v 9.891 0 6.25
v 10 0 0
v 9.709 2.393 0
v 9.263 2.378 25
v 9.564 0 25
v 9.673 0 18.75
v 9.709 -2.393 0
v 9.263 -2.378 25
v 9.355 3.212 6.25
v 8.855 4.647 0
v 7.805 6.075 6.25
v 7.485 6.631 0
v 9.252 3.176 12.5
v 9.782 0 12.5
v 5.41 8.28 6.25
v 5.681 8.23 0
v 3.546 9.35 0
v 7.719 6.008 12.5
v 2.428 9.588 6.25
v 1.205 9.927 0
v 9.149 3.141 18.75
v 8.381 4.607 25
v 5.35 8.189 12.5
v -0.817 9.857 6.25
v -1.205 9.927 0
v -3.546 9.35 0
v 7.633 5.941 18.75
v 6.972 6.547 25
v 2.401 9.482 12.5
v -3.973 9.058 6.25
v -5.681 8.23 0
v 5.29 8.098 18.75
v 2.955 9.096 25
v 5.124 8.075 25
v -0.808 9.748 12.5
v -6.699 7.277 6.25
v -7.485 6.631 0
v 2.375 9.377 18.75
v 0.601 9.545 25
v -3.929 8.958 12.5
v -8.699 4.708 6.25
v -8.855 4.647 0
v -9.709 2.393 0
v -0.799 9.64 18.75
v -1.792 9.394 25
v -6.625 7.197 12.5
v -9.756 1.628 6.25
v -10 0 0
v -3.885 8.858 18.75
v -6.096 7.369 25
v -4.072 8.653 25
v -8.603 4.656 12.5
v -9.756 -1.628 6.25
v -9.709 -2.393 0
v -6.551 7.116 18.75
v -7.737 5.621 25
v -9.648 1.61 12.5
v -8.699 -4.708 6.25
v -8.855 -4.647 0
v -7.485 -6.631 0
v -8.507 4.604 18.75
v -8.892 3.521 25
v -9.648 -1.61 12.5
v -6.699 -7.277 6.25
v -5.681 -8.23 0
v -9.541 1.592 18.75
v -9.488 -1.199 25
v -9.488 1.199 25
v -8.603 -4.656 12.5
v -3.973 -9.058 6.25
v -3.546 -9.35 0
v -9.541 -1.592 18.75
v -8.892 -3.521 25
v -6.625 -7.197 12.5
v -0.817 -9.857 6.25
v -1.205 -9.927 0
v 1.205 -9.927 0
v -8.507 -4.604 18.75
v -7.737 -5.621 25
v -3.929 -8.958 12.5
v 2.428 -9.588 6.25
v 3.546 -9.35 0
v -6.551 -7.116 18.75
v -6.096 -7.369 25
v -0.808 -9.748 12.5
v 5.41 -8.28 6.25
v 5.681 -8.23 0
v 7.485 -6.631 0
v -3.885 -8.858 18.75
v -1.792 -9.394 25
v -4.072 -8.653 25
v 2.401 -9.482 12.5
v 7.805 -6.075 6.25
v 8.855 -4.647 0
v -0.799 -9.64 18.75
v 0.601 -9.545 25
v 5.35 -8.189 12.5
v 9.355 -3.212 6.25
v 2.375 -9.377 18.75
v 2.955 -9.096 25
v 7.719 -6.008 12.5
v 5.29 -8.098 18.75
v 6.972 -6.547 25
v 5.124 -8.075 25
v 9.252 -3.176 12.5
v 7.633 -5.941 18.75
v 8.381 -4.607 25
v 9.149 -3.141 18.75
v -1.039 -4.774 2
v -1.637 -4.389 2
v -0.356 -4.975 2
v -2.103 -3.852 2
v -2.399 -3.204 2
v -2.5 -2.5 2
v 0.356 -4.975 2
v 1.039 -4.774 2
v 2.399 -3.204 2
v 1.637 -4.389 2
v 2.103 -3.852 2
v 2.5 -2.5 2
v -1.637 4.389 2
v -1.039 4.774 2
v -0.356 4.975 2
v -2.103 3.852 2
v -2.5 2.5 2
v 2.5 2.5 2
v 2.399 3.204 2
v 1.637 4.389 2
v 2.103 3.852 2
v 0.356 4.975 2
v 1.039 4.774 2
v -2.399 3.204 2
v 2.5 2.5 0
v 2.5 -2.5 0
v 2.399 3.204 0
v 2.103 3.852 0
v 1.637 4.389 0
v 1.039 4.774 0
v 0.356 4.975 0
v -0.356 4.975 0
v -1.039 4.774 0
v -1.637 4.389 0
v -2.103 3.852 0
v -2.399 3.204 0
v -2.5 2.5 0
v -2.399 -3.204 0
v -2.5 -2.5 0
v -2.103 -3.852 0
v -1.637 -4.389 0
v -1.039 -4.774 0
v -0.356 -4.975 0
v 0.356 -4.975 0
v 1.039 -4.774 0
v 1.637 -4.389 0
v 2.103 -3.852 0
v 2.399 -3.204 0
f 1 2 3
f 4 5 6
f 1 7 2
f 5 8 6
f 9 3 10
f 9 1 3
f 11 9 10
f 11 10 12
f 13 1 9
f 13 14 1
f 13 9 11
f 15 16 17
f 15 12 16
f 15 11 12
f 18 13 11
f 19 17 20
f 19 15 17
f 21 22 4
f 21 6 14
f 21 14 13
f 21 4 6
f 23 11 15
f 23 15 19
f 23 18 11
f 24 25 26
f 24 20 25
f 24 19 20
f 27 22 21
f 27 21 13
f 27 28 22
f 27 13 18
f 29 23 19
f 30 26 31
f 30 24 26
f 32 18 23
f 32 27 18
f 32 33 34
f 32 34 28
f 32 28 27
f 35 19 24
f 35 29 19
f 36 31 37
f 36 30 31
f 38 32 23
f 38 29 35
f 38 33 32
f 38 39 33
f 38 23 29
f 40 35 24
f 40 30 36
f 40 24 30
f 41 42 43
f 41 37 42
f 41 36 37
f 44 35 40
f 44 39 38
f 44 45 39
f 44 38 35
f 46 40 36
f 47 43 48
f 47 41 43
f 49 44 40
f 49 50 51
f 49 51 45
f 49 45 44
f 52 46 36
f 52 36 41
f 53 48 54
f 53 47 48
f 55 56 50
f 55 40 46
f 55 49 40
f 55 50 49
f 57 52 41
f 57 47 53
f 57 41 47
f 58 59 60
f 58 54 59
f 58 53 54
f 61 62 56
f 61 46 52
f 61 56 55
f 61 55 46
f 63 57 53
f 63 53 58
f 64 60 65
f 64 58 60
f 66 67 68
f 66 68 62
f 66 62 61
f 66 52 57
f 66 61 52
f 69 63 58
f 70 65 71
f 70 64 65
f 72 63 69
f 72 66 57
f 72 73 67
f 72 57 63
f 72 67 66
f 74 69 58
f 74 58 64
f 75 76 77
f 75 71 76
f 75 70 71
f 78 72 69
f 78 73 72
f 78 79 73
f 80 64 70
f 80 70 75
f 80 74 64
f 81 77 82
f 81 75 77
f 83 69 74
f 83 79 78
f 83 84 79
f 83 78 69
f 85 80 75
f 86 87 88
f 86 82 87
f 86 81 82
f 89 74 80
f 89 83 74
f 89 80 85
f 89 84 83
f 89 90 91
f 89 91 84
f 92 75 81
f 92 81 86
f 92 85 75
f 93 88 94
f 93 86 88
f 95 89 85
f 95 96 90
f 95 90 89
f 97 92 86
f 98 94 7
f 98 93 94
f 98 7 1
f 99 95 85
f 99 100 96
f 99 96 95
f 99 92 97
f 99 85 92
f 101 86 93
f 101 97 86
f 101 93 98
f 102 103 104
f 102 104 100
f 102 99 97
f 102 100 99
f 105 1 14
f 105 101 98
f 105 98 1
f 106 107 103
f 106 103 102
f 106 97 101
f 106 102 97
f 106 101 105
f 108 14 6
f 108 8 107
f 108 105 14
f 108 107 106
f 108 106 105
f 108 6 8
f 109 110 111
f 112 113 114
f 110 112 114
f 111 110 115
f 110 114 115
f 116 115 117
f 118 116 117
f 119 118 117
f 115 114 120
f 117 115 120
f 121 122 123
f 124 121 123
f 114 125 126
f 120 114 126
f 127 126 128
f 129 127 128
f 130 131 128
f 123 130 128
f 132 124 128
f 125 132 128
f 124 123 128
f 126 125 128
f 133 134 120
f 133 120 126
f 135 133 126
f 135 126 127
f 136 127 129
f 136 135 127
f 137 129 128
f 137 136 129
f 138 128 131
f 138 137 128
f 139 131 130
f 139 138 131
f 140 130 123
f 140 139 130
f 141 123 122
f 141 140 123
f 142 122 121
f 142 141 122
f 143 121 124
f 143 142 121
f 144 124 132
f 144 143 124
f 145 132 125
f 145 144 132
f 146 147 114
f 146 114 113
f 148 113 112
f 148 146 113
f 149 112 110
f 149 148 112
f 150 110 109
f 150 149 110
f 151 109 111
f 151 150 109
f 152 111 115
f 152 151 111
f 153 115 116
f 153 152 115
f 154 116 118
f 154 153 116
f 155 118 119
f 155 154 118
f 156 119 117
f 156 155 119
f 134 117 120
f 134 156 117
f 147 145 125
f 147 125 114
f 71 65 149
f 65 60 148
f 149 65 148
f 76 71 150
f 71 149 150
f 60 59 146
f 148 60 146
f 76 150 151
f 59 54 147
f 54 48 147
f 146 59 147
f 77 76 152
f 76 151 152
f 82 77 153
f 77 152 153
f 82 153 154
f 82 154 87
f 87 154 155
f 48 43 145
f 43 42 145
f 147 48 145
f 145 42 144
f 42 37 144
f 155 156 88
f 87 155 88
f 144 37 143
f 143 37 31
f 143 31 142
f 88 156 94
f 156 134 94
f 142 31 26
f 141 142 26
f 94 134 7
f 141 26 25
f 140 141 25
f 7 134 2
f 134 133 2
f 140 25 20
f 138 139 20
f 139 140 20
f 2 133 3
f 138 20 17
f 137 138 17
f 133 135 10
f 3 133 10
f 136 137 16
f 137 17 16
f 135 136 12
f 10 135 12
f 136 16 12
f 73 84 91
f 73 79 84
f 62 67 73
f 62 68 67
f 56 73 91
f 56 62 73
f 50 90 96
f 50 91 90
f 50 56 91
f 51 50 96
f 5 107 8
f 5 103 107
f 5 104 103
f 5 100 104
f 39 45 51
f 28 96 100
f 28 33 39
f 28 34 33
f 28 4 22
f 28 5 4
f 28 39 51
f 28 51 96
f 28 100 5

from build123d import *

# Parameters (mm, degrees)
BASE_R         = 10
CYLINDER_DEPTH = 25
CYLINDER_TAPER = 1
KEY_SLOT_DEPTH = 2


# Read off the part's stored shape, not the designer's step: key slot
with BuildPart() as part:
    # base → cylinder (new body)
    with BuildSketch(Plane.XY):
        Circle(BASE_R)
    extrude(amount=CYLINDER_DEPTH, taper=CYLINDER_TAPER)

    # key slot outline → key slot (cut)
    with BuildSketch(Plane.XY):
        with BuildLine():
            Line((-2.5, 2.5), (-2.5, -2.5))
            ThreePointArc((-2.5, -2.5), (0, -5), (2.5, -2.5))
            Line((2.5, -2.5), (2.5, 2.5))
            ThreePointArc((2.5, 2.5), (0, 5), (-2.5, 2.5))
        make_face()
    extrude(amount=KEY_SLOT_DEPTH, mode=Mode.SUBTRACT)


solid = part.part
